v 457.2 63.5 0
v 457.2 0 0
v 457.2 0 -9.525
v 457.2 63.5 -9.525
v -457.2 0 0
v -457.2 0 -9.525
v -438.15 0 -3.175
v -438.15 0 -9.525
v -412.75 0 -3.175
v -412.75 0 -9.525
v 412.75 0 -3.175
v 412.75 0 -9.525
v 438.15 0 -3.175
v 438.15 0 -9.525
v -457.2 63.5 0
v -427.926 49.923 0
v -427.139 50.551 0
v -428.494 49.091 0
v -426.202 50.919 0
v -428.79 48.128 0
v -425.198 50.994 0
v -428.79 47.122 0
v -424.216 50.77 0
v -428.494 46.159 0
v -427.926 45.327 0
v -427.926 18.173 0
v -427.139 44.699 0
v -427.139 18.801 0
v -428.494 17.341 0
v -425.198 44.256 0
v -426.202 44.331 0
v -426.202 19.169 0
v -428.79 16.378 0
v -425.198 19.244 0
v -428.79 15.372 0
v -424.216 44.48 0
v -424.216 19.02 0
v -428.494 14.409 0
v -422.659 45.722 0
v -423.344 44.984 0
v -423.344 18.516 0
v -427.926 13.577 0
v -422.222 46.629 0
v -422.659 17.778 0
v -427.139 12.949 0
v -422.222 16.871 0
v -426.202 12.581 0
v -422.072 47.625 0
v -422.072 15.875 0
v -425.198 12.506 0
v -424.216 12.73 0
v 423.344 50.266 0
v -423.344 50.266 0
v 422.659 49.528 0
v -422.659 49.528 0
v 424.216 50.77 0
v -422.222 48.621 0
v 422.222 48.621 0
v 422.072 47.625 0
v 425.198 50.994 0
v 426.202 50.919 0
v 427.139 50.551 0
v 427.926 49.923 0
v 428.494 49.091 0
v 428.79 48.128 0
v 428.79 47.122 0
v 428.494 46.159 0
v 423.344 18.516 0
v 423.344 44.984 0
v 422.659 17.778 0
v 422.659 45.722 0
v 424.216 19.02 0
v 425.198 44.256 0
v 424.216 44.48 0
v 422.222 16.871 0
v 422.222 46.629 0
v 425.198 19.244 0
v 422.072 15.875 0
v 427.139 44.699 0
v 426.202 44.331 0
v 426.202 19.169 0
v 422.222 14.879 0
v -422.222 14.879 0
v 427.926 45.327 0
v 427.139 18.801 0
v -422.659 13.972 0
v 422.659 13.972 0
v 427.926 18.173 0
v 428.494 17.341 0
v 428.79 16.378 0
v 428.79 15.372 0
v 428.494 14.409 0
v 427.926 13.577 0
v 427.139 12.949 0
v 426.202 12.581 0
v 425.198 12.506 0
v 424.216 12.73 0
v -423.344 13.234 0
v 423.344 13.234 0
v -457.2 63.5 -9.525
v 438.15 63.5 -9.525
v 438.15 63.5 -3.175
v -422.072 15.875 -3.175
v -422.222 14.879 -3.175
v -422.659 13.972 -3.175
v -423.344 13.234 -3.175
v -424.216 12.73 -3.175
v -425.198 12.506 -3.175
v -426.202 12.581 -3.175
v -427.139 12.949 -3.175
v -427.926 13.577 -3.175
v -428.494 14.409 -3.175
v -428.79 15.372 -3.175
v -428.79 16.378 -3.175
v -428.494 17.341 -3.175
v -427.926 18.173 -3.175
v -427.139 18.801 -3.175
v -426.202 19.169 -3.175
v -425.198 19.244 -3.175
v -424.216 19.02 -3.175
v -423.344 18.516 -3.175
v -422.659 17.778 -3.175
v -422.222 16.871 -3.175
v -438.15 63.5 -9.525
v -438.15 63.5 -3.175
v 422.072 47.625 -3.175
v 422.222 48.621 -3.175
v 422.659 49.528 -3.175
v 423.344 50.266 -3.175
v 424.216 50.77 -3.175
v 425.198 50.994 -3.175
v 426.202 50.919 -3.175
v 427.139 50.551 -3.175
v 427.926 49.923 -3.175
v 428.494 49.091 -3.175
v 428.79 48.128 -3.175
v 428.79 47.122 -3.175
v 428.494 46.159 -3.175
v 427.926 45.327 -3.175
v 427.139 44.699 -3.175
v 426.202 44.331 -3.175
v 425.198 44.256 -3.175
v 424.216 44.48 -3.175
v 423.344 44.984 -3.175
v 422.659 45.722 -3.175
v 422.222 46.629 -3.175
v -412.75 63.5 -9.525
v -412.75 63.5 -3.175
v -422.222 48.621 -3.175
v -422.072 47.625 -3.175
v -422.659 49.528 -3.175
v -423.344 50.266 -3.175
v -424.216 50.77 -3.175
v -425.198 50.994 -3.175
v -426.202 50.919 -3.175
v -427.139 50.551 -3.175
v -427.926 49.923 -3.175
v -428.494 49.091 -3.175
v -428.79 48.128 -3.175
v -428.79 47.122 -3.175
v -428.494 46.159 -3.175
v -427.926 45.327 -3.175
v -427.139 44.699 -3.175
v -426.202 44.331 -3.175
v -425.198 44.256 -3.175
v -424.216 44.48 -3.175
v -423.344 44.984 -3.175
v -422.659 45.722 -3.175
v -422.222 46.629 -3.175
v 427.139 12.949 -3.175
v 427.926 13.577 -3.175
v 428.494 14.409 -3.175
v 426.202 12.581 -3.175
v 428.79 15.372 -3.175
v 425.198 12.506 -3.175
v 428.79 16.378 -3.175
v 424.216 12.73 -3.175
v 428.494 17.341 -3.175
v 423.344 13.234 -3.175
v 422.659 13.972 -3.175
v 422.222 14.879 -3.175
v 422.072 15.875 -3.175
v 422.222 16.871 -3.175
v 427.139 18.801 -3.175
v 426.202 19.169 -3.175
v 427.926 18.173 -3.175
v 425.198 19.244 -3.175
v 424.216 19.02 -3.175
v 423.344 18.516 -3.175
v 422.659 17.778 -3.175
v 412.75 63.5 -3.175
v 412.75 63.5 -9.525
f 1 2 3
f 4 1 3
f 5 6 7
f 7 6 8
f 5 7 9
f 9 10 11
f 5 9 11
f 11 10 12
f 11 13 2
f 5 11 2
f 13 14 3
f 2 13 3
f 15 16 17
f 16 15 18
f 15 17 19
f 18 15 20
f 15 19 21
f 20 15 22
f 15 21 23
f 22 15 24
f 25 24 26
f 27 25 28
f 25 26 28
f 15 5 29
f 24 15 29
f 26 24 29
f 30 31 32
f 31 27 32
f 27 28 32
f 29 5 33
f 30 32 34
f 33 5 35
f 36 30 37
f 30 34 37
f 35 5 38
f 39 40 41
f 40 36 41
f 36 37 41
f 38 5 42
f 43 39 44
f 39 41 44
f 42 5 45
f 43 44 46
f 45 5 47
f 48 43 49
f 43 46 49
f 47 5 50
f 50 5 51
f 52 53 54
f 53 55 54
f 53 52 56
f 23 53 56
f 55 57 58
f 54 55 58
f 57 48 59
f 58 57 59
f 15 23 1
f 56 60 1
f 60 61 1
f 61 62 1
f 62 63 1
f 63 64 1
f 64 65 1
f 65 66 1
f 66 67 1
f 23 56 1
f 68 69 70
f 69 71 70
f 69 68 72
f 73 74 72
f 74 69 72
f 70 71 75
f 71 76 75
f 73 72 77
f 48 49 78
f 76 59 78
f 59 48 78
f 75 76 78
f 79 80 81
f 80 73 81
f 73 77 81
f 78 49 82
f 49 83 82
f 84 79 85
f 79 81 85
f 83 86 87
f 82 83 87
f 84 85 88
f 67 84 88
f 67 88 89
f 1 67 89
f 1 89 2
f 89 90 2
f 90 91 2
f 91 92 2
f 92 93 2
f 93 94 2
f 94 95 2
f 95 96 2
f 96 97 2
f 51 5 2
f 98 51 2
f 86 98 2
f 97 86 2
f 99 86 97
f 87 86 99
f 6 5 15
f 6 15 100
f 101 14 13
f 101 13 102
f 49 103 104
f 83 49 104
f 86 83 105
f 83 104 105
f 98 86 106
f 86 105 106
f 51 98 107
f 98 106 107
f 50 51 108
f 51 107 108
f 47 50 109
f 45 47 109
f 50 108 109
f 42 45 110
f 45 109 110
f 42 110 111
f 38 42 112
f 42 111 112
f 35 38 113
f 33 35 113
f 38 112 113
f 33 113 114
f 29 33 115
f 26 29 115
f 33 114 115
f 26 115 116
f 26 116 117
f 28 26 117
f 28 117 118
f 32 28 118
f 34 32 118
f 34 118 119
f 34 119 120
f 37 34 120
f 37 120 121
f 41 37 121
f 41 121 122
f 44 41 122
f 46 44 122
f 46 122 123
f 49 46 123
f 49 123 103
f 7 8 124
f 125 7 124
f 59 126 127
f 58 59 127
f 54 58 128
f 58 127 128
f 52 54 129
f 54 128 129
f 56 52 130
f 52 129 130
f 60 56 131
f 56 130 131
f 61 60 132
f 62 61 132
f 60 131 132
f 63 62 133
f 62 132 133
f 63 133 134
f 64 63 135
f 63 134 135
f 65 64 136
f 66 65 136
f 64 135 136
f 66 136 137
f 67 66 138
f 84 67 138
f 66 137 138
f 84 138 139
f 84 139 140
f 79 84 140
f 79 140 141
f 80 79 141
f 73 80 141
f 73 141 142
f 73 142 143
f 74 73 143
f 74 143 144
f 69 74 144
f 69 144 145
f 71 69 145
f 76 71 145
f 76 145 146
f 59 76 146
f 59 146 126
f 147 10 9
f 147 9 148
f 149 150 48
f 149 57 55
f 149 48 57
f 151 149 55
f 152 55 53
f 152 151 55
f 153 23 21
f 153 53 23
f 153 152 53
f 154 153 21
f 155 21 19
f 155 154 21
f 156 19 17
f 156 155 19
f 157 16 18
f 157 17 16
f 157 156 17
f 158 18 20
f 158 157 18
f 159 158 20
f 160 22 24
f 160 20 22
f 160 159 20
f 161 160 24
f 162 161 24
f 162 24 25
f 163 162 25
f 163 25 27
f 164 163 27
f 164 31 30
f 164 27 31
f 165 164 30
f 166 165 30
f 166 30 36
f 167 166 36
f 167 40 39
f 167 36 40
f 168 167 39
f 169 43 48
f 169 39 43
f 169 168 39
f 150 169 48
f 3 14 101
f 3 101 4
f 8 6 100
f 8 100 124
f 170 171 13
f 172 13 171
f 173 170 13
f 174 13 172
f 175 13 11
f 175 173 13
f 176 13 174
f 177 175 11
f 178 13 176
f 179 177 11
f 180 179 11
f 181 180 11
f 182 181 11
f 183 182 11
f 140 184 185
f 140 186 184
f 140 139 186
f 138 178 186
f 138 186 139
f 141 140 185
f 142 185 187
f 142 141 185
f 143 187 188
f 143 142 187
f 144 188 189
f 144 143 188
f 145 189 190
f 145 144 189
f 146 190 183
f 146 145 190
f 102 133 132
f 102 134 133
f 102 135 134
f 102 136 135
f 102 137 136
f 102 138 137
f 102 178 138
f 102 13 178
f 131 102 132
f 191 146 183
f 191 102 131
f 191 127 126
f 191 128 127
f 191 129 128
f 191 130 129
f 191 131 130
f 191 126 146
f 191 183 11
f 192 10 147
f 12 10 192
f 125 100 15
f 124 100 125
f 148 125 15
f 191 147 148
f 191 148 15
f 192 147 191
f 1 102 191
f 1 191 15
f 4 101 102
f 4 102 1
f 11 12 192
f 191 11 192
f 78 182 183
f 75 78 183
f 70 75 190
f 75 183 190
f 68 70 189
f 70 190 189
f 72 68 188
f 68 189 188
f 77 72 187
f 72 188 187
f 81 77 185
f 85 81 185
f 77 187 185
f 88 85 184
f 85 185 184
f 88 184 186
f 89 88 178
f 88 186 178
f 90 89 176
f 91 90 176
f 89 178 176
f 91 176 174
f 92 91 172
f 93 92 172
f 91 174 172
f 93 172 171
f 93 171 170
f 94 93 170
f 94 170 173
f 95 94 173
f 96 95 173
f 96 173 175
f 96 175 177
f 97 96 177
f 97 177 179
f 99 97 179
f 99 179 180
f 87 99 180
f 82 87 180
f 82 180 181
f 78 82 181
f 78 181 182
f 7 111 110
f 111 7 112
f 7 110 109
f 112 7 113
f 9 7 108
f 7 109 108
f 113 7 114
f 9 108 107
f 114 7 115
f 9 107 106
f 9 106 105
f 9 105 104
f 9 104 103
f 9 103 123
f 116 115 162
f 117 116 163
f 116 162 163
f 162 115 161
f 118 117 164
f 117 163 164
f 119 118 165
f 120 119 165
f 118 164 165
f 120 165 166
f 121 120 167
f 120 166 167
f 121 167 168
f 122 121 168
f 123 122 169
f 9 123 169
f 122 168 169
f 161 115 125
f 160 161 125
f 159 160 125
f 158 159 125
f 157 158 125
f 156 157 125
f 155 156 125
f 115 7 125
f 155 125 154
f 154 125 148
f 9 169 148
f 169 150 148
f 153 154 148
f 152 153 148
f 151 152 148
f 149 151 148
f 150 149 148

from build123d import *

# Parameters (mm, degrees)
SKETCH1_W               = 914.4
SKETCH1_H               = 9.525
BOSS_EXTRUDE1_DEPTH     = 63.5
SKETCH2_W               = 25.4
SKETCH2_H               = 63.5
CUT_EXTRUDE1_DEPTH      = 6.35
F_1_4_CLEARANCE_HOLE1_D = 6.7564
LPATTERN1_COUNT         = 3
LPATTERN1_PITCH         = 15.875
MIRROR1_COPY_1_D        = 6.7564


with BuildPart() as part:
    # Sketch1 → Boss-Extrude1 (new body)
    with BuildSketch(Plane(origin=(0, 0, 0), x_dir=(1, 0, 0), z_dir=(0, 1, 0))):
        with Locations((0, 4.7625)):
            Rectangle(SKETCH1_W, SKETCH1_H)
    extrude(amount=BOSS_EXTRUDE1_DEPTH)

    # Sketch2 → Cut-Extrude1 (cut)
    with BuildSketch(Plane(origin=(0, 0, -9.525), x_dir=(-1, 0, 0), z_dir=(0, 0, -1))):
        with Locations((-425.45, 31.75)):
            Rectangle(SKETCH2_W, SKETCH2_H)
    cut_extrude1 = extrude(amount=-CUT_EXTRUDE1_DEPTH, mode=Mode.SUBTRACT)

    # 1/4 Clearance Hole1 (through all)
    with Locations(Plane.XY):
        with Locations((425.45, 47.625)):
            f_1_4_clearance_hole1 = Hole(F_1_4_CLEARANCE_HOLE1_D / 2)

    # LPattern1: 1/4 Clearance Hole1 ×3, 1 skipped
    with Locations(*[(0, -i * LPATTERN1_PITCH, 0) for i in range(1, LPATTERN1_COUNT) if i not in (1,)]):
        add(f_1_4_clearance_hole1, mode=Mode.SUBTRACT)

    # Mirror1: Cut-Extrude1, 1/4 Clearance Hole1 across plane
    add(cut_extrude1.mirror(Plane(origin=(0, 0, 0), x_dir=(0, 0, 1), z_dir=(1, 0, 0))), mode=Mode.SUBTRACT)
    add(f_1_4_clearance_hole1.mirror(Plane(origin=(0, 0, 0), x_dir=(0, 0, 1), z_dir=(1, 0, 0))), mode=Mode.SUBTRACT)

    # Mirror1 copy 1 (through all)
    with Locations(Plane(origin=(0, -31.75, 0), x_dir=(-1, 0, 0), z_dir=(0, 0, 1))):
        with Locations((425.45, -47.625)):
            Hole(MIRROR1_COPY_1_D / 2)


solid = part.part
